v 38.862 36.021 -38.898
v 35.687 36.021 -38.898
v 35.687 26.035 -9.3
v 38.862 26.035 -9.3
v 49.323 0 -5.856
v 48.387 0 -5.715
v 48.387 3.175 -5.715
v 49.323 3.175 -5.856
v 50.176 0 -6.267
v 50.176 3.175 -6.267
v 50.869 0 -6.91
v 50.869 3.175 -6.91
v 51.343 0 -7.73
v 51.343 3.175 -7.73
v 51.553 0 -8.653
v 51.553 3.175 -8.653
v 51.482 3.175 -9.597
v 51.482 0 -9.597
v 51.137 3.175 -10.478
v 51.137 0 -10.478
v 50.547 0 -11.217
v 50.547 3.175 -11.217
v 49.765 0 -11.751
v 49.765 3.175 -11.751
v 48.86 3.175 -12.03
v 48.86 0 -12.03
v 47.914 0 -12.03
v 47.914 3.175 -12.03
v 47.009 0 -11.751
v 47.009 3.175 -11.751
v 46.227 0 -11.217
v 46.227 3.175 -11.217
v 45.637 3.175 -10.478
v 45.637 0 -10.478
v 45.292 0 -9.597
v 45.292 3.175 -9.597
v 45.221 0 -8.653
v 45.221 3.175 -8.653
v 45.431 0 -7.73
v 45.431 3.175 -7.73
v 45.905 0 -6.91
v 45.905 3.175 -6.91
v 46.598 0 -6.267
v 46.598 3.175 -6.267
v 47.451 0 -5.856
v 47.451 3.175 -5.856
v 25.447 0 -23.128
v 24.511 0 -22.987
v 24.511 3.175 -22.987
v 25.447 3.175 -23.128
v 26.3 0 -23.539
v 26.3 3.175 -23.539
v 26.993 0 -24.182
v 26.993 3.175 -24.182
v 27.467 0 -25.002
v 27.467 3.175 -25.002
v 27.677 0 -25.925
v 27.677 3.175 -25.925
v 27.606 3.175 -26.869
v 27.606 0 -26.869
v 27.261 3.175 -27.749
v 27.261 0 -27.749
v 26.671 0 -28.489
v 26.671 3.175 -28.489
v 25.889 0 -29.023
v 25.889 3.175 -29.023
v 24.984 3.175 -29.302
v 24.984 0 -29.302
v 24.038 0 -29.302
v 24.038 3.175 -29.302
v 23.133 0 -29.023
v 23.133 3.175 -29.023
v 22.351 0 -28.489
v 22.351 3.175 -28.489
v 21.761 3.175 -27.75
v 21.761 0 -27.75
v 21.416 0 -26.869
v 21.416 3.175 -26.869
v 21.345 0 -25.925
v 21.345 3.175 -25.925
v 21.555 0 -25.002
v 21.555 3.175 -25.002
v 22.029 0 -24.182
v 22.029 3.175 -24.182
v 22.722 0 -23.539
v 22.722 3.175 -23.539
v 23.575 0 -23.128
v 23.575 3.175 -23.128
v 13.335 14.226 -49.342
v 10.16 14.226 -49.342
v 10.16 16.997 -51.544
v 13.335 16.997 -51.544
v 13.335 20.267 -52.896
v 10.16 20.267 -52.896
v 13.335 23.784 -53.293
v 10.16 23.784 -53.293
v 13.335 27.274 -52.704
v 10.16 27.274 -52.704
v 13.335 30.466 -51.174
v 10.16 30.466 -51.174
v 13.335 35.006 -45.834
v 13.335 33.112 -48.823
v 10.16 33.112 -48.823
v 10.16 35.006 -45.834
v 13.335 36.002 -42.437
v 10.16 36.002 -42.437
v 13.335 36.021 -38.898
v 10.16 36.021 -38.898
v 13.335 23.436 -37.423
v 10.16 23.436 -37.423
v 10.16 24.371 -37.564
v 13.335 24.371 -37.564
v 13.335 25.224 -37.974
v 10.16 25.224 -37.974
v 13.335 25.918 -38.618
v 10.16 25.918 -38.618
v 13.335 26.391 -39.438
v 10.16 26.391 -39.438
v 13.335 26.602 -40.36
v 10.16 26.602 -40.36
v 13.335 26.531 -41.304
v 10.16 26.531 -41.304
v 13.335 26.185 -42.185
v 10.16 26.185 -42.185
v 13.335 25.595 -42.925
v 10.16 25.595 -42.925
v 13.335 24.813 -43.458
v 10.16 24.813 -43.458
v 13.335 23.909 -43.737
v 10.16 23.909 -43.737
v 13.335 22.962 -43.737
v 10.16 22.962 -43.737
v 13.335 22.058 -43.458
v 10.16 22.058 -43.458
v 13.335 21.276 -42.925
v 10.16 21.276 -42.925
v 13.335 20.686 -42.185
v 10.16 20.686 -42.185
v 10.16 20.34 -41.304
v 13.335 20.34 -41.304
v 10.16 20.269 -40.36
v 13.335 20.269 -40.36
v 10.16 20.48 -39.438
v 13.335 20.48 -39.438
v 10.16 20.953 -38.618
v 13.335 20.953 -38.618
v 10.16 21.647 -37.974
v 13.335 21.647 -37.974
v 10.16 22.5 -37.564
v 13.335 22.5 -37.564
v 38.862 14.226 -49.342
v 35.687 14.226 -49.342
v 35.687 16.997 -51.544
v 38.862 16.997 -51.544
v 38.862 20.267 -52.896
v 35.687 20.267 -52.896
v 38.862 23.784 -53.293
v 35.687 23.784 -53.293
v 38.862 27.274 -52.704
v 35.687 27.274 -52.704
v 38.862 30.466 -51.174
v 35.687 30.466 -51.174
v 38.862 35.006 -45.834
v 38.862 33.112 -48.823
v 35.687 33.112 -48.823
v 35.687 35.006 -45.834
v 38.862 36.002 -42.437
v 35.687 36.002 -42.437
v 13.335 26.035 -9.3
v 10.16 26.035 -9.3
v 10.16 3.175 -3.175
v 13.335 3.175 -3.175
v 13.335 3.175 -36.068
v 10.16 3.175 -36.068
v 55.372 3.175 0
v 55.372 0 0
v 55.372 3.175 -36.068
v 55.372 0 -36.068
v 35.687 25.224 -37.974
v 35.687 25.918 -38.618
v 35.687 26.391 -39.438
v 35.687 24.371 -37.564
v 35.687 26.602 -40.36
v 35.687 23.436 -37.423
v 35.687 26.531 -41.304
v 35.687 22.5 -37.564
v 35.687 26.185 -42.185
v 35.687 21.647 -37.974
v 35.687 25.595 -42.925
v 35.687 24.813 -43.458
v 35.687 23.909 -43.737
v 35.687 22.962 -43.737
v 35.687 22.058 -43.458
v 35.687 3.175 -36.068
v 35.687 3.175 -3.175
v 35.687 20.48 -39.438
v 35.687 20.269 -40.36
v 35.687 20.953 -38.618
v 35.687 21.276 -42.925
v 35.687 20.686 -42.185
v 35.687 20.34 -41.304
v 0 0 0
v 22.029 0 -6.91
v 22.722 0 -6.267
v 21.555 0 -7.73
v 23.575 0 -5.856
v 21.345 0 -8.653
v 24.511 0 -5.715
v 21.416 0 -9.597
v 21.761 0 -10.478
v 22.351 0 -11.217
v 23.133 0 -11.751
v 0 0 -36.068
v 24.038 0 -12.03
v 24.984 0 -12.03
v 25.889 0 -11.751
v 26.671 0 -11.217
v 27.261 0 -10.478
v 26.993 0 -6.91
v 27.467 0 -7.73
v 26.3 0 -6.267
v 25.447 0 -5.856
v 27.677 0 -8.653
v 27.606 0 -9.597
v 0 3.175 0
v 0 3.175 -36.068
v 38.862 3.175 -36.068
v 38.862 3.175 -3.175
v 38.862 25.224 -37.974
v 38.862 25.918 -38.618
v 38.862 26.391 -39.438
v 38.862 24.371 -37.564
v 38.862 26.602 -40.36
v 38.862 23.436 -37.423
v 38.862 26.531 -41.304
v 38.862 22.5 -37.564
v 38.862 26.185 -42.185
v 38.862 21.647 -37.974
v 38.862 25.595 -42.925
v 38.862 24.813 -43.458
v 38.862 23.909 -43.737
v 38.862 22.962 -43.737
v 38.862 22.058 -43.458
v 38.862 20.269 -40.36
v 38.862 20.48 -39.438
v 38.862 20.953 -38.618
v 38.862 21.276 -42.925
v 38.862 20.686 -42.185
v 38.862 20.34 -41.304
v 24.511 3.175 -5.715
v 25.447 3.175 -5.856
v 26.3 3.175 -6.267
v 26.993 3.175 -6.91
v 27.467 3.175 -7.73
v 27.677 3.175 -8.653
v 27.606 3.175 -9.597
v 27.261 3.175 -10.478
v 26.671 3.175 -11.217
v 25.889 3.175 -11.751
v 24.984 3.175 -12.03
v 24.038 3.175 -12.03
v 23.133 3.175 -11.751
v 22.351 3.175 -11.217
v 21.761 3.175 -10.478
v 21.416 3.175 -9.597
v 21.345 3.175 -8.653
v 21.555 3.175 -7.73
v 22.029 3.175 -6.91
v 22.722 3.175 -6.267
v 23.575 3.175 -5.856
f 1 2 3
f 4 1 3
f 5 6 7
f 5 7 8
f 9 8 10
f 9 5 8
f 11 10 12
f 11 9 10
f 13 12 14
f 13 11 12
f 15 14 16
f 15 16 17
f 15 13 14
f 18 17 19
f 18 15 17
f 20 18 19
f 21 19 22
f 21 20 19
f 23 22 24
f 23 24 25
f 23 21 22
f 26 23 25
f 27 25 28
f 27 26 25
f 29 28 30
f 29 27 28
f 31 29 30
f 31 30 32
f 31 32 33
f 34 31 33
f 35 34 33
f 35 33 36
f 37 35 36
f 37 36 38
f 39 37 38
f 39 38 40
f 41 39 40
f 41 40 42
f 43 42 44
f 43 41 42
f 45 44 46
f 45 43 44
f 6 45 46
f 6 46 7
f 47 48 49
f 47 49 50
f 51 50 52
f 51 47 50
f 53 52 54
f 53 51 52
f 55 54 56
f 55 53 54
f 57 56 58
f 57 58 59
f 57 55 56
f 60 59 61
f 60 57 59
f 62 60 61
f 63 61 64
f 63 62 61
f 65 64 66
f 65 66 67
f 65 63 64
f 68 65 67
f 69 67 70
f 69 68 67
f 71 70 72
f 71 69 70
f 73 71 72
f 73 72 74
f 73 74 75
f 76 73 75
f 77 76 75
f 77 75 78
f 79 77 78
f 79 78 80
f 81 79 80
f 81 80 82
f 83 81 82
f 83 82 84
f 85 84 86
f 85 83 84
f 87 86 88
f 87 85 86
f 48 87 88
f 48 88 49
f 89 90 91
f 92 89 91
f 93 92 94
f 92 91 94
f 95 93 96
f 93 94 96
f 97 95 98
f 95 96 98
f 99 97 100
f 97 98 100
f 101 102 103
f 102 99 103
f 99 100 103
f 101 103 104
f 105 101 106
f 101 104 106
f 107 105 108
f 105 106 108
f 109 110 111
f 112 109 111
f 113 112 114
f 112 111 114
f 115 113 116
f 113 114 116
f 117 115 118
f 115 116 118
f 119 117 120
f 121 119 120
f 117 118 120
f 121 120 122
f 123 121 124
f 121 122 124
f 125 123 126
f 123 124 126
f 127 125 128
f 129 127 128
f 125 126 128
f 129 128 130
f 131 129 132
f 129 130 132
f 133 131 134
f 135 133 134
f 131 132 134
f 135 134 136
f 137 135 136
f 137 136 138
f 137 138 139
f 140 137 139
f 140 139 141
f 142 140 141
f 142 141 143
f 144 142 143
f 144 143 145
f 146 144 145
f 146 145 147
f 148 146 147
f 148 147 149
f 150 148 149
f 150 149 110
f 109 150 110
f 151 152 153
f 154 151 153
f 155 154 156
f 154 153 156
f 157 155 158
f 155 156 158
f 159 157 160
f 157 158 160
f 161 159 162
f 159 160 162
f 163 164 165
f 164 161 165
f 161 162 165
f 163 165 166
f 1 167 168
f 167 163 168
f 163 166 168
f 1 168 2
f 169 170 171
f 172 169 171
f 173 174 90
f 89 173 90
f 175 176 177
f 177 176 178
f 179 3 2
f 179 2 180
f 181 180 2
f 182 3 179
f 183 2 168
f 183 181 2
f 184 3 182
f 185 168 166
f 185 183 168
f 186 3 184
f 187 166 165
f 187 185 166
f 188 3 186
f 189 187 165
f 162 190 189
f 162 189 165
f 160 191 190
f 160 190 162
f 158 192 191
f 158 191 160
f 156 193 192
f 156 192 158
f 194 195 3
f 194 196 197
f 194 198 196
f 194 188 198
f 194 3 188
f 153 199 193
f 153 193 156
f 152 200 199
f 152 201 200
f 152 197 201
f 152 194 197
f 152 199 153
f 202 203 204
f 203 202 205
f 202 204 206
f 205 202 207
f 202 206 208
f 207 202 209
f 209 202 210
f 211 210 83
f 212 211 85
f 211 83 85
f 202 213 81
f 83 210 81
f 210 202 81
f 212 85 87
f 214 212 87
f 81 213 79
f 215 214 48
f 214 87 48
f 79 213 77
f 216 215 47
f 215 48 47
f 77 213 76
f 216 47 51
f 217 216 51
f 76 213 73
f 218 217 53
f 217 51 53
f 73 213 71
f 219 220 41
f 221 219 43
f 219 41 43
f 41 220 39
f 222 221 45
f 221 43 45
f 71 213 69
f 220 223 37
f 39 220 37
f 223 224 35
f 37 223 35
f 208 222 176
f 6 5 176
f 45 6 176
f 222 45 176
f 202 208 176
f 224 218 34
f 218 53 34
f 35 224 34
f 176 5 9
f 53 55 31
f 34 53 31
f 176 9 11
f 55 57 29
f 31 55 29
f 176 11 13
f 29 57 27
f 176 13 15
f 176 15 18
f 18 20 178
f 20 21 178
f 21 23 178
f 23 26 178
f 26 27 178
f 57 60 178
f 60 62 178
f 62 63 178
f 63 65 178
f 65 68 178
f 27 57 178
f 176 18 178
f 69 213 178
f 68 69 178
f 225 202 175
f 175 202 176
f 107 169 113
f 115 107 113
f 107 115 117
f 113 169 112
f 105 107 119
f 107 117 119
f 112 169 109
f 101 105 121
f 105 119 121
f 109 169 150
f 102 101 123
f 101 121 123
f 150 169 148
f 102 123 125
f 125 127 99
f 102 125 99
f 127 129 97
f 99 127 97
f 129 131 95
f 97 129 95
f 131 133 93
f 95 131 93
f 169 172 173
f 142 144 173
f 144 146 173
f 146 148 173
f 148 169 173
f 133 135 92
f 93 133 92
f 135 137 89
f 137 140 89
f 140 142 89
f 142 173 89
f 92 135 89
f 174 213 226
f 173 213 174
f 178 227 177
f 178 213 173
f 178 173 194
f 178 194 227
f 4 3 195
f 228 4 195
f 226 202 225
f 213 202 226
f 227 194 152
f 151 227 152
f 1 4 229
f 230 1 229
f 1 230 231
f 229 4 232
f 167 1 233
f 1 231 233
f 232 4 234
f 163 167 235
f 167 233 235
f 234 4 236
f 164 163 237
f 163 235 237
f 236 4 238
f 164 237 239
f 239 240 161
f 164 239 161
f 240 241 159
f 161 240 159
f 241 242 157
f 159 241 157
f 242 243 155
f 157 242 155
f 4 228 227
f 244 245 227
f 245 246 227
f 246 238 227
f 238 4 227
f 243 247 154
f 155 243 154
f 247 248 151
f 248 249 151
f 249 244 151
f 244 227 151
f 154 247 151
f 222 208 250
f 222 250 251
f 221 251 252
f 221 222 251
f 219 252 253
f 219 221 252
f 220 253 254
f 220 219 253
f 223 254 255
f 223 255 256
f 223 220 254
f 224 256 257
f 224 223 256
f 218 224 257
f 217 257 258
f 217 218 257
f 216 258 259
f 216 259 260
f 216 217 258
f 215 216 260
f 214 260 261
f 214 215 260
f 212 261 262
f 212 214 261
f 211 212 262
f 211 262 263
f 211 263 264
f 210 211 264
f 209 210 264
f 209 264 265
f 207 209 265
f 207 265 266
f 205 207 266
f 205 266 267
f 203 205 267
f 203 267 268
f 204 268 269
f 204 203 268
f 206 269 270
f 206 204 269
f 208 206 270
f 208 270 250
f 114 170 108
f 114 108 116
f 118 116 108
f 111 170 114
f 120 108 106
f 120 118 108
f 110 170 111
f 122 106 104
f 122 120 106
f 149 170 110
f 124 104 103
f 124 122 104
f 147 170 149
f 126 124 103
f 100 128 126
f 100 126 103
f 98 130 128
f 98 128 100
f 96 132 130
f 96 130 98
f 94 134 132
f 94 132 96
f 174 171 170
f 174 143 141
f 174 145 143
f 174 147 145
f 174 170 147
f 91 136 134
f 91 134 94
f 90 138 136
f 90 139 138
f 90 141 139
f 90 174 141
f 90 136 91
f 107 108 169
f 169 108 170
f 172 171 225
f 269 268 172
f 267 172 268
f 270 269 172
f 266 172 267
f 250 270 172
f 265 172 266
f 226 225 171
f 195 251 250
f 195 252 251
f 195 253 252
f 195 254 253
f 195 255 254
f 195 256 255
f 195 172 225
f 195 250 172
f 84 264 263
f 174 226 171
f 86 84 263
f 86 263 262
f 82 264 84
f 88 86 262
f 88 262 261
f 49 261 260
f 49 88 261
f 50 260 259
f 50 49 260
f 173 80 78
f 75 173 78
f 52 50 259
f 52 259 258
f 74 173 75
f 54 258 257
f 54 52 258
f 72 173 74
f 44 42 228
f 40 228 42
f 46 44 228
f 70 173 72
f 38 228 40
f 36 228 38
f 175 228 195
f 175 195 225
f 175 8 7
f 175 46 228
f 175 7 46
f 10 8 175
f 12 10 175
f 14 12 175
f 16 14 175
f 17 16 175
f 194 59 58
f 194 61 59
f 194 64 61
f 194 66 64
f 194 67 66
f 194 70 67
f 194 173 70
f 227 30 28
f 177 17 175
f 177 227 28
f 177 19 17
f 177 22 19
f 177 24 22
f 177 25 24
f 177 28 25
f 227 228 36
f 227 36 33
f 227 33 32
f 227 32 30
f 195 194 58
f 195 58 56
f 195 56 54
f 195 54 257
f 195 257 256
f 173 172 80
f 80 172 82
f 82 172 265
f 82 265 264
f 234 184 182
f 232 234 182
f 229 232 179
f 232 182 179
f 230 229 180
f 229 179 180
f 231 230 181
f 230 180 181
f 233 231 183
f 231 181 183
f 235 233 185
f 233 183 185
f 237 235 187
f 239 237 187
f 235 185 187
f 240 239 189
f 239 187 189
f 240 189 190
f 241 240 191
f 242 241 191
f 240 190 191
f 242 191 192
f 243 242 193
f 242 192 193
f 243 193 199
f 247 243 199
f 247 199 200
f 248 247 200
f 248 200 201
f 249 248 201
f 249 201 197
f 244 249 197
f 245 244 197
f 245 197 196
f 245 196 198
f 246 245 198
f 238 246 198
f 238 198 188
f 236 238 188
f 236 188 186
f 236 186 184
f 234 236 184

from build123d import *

# Parameters (mm, degrees)
SKETCH1_W           = 55.372
SKETCH1_H           = 36.068
SKETCH1_R           = 3.175
BOSS_EXTRUDE1_DEPTH = 3.175
SKETCH2_W           = 3.175
SKETCH2_H           = 50.8
BOSS_EXTRUDE2_DEPTH = 38.1
CUT_EXTRUDE1_REACH  = 83.615
SKETCH3_R           = 3.175
CUT_EXTRUDE2_DEPTH  = 82.615263242


with BuildPart() as part:
    # Sketch1 → Boss-Extrude1 (new body)
    with BuildSketch(Plane(origin=(0, 0, 0), x_dir=(1, 0, 0), z_dir=(0, 1, 0))):
        with Locations((27.686, 18.034)):
            Rectangle(SKETCH1_W, SKETCH1_H)
        with Locations(Location((24.511, 8.89, 0), (0, 0, 270))):
            Circle(SKETCH1_R, mode=Mode.SUBTRACT)
        with Locations(Location((24.511, 26.162, 0), (0, 0, 270))):
            Circle(SKETCH1_R, mode=Mode.SUBTRACT)
        with Locations(Location((48.387, 8.89, 0), (0, 0, 270))):
            Circle(SKETCH1_R, mode=Mode.SUBTRACT)
    extrude(amount=BOSS_EXTRUDE1_DEPTH)

    # Sketch2 → Boss-Extrude2 (add)
    with BuildSketch(Plane(origin=(0, 3.175, 0), x_dir=(1, 0, 0), z_dir=(0, 1, 0))):
        with Locations((11.7475, 28.575)):
            Rectangle(SKETCH2_W, SKETCH2_H)
        with Locations((37.2745, 28.575)):
            Rectangle(SKETCH2_W, SKETCH2_H)
    extrude(amount=BOSS_EXTRUDE2_DEPTH)

    # Cut-Extrude1: up to this face of the body (flat: up to its plane)
    cut_extrude1_end = Plane(part.part.faces().sort_by_distance((38.862, 22.225, -28.575))[0])
    # Sketch3 → Cut-Extrude1 (cut, up to the picked face)
    with BuildSketch(Plane.ZY.offset(-10.16), mode=Mode.PRIVATE) as cut_extrude1_sk1:
        with Locations((-40.597508243, 23.435544859)):
            Circle(SKETCH3_R)
    cut_extrude1_tool1 = split(extrude(cut_extrude1_sk1.sketch, amount=-CUT_EXTRUDE1_REACH, mode=Mode.PRIVATE), bisect_by=cut_extrude1_end, keep=Keep.BOTH, mode=Mode.PRIVATE)
    add(cut_extrude1_tool1.solids().sort_by(Axis((10.16, 23.435545, -40.597508), (1, 0, 0)))[0], mode=Mode.SUBTRACT)

    # Sketch4 → Cut-Extrude2 (cut, through all)
    with BuildSketch(Plane.ZY.offset(-10.16)):
        with BuildLine():
            Line((-3.175, 3.175), (-3.175, 41.275))
            Line((-3.175, 41.275), (-53.975, 41.275))
            Line((-53.975, 41.275), (-53.975, 3.175))
            Line((-53.975, 3.175), (-36.068, 3.175))
            Line((-36.068, 3.175), (-49.342170052, 14.225719136))
            ThreePointArc((-49.342170052, 14.225719136), (-52.050540003, 28.923537523), (-38.898272892, 36.021354297))
            Line((-38.898272892, 36.021354297), (-9.300318539, 26.035))
            Line((-9.300318539, 26.035), (-3.175, 3.175))
        make_face()
    extrude(amount=-CUT_EXTRUDE2_DEPTH, mode=Mode.SUBTRACT)


solid = part.part
